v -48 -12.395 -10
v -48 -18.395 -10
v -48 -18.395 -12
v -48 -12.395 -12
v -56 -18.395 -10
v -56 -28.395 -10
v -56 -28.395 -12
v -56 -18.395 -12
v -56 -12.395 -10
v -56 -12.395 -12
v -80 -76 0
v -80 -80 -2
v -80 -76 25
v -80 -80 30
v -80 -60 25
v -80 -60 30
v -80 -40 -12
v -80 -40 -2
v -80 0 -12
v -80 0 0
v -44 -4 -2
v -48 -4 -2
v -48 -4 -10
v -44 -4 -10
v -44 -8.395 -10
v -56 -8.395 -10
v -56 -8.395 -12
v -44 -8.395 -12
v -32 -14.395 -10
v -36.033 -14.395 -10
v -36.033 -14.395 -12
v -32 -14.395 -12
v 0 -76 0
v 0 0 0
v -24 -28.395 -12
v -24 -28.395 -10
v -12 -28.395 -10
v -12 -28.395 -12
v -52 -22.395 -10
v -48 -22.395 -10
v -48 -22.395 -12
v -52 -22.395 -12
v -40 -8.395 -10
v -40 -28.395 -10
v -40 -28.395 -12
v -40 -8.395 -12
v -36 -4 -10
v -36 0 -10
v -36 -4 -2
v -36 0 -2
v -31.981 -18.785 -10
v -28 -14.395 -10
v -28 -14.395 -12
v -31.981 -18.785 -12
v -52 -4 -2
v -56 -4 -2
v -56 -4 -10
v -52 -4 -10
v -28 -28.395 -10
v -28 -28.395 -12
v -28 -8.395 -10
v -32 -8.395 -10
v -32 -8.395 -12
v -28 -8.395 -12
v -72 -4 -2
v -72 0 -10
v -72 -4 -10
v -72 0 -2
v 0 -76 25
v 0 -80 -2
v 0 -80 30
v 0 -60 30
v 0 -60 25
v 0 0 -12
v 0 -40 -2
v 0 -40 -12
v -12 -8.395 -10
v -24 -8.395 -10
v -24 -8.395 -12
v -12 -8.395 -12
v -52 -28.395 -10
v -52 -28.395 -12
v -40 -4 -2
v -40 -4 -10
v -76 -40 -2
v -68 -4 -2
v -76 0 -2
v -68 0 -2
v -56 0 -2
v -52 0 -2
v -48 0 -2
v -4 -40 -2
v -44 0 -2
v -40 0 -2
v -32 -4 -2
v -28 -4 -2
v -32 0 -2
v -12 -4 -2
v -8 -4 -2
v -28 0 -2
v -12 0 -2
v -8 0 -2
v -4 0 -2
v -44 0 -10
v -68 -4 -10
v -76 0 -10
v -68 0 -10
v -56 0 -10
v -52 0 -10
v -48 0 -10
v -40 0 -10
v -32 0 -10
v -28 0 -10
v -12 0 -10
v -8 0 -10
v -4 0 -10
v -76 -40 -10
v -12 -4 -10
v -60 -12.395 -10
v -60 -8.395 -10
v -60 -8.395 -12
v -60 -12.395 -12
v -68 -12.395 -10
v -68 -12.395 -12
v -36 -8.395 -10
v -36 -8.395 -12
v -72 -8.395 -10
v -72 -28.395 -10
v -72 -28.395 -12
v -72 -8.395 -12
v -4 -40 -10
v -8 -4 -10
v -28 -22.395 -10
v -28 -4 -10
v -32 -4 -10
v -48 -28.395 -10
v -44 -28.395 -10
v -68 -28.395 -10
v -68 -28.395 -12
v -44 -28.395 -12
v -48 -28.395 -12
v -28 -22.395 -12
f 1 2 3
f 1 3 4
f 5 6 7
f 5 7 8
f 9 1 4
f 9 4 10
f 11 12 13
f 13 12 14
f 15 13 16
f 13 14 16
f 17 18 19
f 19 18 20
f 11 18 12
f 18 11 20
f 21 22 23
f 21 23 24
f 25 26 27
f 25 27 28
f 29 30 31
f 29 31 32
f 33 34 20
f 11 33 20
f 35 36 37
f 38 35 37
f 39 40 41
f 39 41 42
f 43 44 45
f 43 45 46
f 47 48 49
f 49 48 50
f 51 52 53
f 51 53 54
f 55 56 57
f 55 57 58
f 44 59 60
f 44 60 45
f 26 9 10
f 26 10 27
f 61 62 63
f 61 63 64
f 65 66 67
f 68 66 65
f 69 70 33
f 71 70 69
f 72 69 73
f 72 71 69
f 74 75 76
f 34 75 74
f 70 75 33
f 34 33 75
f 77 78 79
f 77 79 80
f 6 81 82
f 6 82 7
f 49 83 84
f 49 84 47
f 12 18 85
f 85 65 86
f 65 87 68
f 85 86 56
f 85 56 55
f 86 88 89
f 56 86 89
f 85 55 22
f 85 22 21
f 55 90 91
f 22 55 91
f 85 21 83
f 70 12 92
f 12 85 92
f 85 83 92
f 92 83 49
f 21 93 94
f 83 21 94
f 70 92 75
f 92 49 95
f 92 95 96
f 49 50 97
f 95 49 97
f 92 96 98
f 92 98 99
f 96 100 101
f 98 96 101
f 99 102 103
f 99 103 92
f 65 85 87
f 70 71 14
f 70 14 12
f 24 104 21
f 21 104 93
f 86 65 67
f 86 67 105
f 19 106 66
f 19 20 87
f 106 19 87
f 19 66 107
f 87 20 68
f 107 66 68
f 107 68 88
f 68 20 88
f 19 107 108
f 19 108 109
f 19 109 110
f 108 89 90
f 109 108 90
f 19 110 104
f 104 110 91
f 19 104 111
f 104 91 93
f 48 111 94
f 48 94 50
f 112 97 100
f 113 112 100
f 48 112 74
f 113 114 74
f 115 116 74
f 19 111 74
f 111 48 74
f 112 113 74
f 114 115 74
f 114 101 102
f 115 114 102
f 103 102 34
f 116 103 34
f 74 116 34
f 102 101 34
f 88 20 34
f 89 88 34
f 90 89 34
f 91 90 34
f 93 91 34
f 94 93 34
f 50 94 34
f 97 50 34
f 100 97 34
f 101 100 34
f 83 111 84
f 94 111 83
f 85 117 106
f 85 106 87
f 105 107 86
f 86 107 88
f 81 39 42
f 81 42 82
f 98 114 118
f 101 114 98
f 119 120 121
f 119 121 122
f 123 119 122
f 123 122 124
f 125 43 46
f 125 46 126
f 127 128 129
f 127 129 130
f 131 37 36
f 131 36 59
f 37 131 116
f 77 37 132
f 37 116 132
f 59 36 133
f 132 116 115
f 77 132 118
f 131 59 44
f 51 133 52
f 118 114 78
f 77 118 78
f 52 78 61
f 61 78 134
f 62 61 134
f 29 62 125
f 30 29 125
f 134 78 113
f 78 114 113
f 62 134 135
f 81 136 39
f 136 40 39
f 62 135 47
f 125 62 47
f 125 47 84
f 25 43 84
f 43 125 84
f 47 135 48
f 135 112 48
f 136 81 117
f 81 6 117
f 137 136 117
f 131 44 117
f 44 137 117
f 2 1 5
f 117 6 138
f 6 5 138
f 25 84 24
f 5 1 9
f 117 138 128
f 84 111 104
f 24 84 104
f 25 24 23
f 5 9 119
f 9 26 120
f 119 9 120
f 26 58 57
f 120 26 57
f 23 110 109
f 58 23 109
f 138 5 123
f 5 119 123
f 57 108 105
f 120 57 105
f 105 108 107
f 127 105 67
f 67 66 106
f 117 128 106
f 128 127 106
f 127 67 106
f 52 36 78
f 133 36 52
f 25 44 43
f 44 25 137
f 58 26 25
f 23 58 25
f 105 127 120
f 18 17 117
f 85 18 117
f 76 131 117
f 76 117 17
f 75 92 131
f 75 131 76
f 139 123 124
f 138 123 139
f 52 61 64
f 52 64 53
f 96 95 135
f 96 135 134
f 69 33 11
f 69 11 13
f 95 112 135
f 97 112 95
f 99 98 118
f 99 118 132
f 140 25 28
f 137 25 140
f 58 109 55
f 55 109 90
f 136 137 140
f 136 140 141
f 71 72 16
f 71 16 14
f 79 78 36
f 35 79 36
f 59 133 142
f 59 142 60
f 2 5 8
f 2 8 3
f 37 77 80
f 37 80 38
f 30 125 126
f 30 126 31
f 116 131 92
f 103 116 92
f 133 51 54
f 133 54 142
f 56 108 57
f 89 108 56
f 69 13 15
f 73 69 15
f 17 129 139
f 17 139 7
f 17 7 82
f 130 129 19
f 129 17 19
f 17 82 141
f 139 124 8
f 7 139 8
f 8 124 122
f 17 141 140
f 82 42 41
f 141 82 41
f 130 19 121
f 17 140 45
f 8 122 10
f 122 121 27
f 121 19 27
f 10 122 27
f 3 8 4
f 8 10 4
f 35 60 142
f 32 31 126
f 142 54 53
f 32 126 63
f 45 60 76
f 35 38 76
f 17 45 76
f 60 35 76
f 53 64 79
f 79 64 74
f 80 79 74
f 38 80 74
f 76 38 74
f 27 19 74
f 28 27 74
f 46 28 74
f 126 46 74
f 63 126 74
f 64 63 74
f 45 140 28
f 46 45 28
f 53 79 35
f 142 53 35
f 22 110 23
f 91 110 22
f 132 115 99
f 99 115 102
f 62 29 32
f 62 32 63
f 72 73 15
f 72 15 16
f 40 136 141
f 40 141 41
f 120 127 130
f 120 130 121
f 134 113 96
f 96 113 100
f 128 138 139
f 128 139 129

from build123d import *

# Parameters (mm, degrees)
F0_W     = 4
F0_H     = 2
F0_H_2   = 8
F1_DEPTH = 40
F2_DEPTH = 80
F4_DEPTH = 80
F5_DEPTH = 4
F6_W     = 12
F6_H     = 20
F7_DEPTH = 25


with BuildPart() as f1:
    # F0 (on Front) → F1 (new body)
    with BuildSketch(Plane.XZ):
        with Locations((-78, -11)):
            Rectangle(F0_W, F0_H)
        with Locations((-74, -11)):
            Rectangle(F0_W, F0_H)
        with Locations((-70, -11)):
            Rectangle(F0_W, F0_H)
        with Locations((-66, -11)):
            Rectangle(F0_W, F0_H)
        with Locations((-62, -11)):
            Rectangle(F0_W, F0_H)
        with Locations((-58, -11)):
            Rectangle(F0_W, F0_H)
        with Locations((-54, -11)):
            Rectangle(F0_W, F0_H)
        with Locations((-50, -11)):
            Rectangle(F0_W, F0_H)
        with Locations((-46, -11)):
            Rectangle(F0_W, F0_H)
        with Locations((-42, -11)):
            Rectangle(F0_W, F0_H)
        with Locations((-38, -11)):
            Rectangle(F0_W, F0_H)
        with Locations((-34, -11)):
            Rectangle(F0_W, F0_H)
        with Locations((-30, -11)):
            Rectangle(F0_W, F0_H)
        with Locations((-26, -11)):
            Rectangle(F0_W, F0_H)
        with Locations((-22, -11)):
            Rectangle(F0_W, F0_H)
        with Locations((-18, -11)):
            Rectangle(F0_W, F0_H)
        with Locations((-14, -11)):
            Rectangle(F0_W, F0_H)
        with Locations((-10, -11)):
            Rectangle(F0_W, F0_H)
        with Locations((-6, -11)):
            Rectangle(F0_W, F0_H)
        with Locations((-2, -11)):
            Rectangle(F0_W, F0_H)
        with Locations((-78, -6)):
            Rectangle(F0_W, F0_H_2)
        with Locations((-2, -6)):
            Rectangle(F0_W, F0_H_2)
    extrude(amount=F1_DEPTH)

    # F0 (on Front) → F2 (join)
    with BuildSketch(Plane.XZ):
        with Locations((-78, -1)):
            Rectangle(F0_W, F0_H)
        with Locations((-70, -1)):
            Rectangle(F0_W, F0_H)
        with Locations((-74, -1)):
            Rectangle(F0_W, F0_H)
        with Locations((-66, -1)):
            Rectangle(F0_W, F0_H)
        with Locations((-62, -1)):
            Rectangle(F0_W, F0_H)
        with Locations((-58, -1)):
            Rectangle(F0_W, F0_H)
        with Locations((-54, -1)):
            Rectangle(F0_W, F0_H)
        with Locations((-50, -1)):
            Rectangle(F0_W, F0_H)
        with Locations((-46, -1)):
            Rectangle(F0_W, F0_H)
        with Locations((-42, -1)):
            Rectangle(F0_W, F0_H)
        with Locations((-38, -1)):
            Rectangle(F0_W, F0_H)
        with Locations((-34, -1)):
            Rectangle(F0_W, F0_H)
        with Locations((-30, -1)):
            Rectangle(F0_W, F0_H)
        with Locations((-26, -1)):
            Rectangle(F0_W, F0_H)
        with Locations((-22, -1)):
            Rectangle(F0_W, F0_H)
        with Locations((-18, -1)):
            Rectangle(F0_W, F0_H)
        with Locations((-14, -1)):
            Rectangle(F0_W, F0_H)
        with Locations((-6, -1)):
            Rectangle(F0_W, F0_H)
        with Locations((-2, -1)):
            Rectangle(F0_W, F0_H)
        with Locations((-10, -1)):
            Rectangle(F0_W, F0_H)
    extrude(amount=F2_DEPTH)

    # F3 (on Right) → F4 (join)
    with BuildSketch(Plane.YZ):
        Polygon((-80, 30), (-80, 0), (-76, 0), (-76, 25), (-60, 25), (-60, 30), align=None)
    extrude(amount=-F4_DEPTH)

    # F0 (on Front) → F5 (join)
    with BuildSketch(Plane.XZ):
        with Locations((-70, -6)):
            Rectangle(F0_W, F0_H_2)
        with Locations((-54, -6)):
            Rectangle(F0_W, F0_H_2)
        with Locations((-46, -6)):
            Rectangle(F0_W, F0_H_2)
        with Locations((-38, -6)):
            Rectangle(F0_W, F0_H_2)
        with Locations((-30, -6)):
            Rectangle(F0_W, F0_H_2)
        with Locations((-10, -6)):
            Rectangle(F0_W, F0_H_2)
    extrude(amount=F5_DEPTH)

    # F6 (on face) → F7 (cut)
    with BuildSketch(Plane(origin=(0, 0, -2), x_dir=(1, 0, 0), z_dir=(0, 0, -1))):
        Polygon((-68, 28.3951728637), (-72, 28.3951728637), (-72, 8.3951728637), (-60, 8.3951728637), (-60, 12.3951728637), (-68, 12.3951728637), align=None)
        with Locations((-18, 18.3951728637)):
            Rectangle(F6_W, F6_H)
        Polygon((-52, 28.3951728637), (-56, 28.3951728637), (-56, 18.3951728637), (-48, 18.3951728637), (-48, 12.3951728637), (-56, 12.3951728637), (-56, 8.3951728637), (-44, 8.3951728637), (-44, 28.3951728637), (-48, 28.3951728637), (-48, 22.3951728637), (-52, 22.3951728637), align=None)
        Polygon((-28, 28.3951728637), (-40, 28.3951728637), (-40, 8.3951728637), (-36, 8.3951728637), (-36.0326175784, 14.3950842042), (-32, 14.3950842042), (-32, 8.3951728637), (-28, 8.3951728637), (-28, 14.3951728637), (-31.9809810322, 18.7847752528), (-28, 22.3951728637), align=None)
    extrude(amount=F7_DEPTH, mode=Mode.SUBTRACT)


solid = f1.part
